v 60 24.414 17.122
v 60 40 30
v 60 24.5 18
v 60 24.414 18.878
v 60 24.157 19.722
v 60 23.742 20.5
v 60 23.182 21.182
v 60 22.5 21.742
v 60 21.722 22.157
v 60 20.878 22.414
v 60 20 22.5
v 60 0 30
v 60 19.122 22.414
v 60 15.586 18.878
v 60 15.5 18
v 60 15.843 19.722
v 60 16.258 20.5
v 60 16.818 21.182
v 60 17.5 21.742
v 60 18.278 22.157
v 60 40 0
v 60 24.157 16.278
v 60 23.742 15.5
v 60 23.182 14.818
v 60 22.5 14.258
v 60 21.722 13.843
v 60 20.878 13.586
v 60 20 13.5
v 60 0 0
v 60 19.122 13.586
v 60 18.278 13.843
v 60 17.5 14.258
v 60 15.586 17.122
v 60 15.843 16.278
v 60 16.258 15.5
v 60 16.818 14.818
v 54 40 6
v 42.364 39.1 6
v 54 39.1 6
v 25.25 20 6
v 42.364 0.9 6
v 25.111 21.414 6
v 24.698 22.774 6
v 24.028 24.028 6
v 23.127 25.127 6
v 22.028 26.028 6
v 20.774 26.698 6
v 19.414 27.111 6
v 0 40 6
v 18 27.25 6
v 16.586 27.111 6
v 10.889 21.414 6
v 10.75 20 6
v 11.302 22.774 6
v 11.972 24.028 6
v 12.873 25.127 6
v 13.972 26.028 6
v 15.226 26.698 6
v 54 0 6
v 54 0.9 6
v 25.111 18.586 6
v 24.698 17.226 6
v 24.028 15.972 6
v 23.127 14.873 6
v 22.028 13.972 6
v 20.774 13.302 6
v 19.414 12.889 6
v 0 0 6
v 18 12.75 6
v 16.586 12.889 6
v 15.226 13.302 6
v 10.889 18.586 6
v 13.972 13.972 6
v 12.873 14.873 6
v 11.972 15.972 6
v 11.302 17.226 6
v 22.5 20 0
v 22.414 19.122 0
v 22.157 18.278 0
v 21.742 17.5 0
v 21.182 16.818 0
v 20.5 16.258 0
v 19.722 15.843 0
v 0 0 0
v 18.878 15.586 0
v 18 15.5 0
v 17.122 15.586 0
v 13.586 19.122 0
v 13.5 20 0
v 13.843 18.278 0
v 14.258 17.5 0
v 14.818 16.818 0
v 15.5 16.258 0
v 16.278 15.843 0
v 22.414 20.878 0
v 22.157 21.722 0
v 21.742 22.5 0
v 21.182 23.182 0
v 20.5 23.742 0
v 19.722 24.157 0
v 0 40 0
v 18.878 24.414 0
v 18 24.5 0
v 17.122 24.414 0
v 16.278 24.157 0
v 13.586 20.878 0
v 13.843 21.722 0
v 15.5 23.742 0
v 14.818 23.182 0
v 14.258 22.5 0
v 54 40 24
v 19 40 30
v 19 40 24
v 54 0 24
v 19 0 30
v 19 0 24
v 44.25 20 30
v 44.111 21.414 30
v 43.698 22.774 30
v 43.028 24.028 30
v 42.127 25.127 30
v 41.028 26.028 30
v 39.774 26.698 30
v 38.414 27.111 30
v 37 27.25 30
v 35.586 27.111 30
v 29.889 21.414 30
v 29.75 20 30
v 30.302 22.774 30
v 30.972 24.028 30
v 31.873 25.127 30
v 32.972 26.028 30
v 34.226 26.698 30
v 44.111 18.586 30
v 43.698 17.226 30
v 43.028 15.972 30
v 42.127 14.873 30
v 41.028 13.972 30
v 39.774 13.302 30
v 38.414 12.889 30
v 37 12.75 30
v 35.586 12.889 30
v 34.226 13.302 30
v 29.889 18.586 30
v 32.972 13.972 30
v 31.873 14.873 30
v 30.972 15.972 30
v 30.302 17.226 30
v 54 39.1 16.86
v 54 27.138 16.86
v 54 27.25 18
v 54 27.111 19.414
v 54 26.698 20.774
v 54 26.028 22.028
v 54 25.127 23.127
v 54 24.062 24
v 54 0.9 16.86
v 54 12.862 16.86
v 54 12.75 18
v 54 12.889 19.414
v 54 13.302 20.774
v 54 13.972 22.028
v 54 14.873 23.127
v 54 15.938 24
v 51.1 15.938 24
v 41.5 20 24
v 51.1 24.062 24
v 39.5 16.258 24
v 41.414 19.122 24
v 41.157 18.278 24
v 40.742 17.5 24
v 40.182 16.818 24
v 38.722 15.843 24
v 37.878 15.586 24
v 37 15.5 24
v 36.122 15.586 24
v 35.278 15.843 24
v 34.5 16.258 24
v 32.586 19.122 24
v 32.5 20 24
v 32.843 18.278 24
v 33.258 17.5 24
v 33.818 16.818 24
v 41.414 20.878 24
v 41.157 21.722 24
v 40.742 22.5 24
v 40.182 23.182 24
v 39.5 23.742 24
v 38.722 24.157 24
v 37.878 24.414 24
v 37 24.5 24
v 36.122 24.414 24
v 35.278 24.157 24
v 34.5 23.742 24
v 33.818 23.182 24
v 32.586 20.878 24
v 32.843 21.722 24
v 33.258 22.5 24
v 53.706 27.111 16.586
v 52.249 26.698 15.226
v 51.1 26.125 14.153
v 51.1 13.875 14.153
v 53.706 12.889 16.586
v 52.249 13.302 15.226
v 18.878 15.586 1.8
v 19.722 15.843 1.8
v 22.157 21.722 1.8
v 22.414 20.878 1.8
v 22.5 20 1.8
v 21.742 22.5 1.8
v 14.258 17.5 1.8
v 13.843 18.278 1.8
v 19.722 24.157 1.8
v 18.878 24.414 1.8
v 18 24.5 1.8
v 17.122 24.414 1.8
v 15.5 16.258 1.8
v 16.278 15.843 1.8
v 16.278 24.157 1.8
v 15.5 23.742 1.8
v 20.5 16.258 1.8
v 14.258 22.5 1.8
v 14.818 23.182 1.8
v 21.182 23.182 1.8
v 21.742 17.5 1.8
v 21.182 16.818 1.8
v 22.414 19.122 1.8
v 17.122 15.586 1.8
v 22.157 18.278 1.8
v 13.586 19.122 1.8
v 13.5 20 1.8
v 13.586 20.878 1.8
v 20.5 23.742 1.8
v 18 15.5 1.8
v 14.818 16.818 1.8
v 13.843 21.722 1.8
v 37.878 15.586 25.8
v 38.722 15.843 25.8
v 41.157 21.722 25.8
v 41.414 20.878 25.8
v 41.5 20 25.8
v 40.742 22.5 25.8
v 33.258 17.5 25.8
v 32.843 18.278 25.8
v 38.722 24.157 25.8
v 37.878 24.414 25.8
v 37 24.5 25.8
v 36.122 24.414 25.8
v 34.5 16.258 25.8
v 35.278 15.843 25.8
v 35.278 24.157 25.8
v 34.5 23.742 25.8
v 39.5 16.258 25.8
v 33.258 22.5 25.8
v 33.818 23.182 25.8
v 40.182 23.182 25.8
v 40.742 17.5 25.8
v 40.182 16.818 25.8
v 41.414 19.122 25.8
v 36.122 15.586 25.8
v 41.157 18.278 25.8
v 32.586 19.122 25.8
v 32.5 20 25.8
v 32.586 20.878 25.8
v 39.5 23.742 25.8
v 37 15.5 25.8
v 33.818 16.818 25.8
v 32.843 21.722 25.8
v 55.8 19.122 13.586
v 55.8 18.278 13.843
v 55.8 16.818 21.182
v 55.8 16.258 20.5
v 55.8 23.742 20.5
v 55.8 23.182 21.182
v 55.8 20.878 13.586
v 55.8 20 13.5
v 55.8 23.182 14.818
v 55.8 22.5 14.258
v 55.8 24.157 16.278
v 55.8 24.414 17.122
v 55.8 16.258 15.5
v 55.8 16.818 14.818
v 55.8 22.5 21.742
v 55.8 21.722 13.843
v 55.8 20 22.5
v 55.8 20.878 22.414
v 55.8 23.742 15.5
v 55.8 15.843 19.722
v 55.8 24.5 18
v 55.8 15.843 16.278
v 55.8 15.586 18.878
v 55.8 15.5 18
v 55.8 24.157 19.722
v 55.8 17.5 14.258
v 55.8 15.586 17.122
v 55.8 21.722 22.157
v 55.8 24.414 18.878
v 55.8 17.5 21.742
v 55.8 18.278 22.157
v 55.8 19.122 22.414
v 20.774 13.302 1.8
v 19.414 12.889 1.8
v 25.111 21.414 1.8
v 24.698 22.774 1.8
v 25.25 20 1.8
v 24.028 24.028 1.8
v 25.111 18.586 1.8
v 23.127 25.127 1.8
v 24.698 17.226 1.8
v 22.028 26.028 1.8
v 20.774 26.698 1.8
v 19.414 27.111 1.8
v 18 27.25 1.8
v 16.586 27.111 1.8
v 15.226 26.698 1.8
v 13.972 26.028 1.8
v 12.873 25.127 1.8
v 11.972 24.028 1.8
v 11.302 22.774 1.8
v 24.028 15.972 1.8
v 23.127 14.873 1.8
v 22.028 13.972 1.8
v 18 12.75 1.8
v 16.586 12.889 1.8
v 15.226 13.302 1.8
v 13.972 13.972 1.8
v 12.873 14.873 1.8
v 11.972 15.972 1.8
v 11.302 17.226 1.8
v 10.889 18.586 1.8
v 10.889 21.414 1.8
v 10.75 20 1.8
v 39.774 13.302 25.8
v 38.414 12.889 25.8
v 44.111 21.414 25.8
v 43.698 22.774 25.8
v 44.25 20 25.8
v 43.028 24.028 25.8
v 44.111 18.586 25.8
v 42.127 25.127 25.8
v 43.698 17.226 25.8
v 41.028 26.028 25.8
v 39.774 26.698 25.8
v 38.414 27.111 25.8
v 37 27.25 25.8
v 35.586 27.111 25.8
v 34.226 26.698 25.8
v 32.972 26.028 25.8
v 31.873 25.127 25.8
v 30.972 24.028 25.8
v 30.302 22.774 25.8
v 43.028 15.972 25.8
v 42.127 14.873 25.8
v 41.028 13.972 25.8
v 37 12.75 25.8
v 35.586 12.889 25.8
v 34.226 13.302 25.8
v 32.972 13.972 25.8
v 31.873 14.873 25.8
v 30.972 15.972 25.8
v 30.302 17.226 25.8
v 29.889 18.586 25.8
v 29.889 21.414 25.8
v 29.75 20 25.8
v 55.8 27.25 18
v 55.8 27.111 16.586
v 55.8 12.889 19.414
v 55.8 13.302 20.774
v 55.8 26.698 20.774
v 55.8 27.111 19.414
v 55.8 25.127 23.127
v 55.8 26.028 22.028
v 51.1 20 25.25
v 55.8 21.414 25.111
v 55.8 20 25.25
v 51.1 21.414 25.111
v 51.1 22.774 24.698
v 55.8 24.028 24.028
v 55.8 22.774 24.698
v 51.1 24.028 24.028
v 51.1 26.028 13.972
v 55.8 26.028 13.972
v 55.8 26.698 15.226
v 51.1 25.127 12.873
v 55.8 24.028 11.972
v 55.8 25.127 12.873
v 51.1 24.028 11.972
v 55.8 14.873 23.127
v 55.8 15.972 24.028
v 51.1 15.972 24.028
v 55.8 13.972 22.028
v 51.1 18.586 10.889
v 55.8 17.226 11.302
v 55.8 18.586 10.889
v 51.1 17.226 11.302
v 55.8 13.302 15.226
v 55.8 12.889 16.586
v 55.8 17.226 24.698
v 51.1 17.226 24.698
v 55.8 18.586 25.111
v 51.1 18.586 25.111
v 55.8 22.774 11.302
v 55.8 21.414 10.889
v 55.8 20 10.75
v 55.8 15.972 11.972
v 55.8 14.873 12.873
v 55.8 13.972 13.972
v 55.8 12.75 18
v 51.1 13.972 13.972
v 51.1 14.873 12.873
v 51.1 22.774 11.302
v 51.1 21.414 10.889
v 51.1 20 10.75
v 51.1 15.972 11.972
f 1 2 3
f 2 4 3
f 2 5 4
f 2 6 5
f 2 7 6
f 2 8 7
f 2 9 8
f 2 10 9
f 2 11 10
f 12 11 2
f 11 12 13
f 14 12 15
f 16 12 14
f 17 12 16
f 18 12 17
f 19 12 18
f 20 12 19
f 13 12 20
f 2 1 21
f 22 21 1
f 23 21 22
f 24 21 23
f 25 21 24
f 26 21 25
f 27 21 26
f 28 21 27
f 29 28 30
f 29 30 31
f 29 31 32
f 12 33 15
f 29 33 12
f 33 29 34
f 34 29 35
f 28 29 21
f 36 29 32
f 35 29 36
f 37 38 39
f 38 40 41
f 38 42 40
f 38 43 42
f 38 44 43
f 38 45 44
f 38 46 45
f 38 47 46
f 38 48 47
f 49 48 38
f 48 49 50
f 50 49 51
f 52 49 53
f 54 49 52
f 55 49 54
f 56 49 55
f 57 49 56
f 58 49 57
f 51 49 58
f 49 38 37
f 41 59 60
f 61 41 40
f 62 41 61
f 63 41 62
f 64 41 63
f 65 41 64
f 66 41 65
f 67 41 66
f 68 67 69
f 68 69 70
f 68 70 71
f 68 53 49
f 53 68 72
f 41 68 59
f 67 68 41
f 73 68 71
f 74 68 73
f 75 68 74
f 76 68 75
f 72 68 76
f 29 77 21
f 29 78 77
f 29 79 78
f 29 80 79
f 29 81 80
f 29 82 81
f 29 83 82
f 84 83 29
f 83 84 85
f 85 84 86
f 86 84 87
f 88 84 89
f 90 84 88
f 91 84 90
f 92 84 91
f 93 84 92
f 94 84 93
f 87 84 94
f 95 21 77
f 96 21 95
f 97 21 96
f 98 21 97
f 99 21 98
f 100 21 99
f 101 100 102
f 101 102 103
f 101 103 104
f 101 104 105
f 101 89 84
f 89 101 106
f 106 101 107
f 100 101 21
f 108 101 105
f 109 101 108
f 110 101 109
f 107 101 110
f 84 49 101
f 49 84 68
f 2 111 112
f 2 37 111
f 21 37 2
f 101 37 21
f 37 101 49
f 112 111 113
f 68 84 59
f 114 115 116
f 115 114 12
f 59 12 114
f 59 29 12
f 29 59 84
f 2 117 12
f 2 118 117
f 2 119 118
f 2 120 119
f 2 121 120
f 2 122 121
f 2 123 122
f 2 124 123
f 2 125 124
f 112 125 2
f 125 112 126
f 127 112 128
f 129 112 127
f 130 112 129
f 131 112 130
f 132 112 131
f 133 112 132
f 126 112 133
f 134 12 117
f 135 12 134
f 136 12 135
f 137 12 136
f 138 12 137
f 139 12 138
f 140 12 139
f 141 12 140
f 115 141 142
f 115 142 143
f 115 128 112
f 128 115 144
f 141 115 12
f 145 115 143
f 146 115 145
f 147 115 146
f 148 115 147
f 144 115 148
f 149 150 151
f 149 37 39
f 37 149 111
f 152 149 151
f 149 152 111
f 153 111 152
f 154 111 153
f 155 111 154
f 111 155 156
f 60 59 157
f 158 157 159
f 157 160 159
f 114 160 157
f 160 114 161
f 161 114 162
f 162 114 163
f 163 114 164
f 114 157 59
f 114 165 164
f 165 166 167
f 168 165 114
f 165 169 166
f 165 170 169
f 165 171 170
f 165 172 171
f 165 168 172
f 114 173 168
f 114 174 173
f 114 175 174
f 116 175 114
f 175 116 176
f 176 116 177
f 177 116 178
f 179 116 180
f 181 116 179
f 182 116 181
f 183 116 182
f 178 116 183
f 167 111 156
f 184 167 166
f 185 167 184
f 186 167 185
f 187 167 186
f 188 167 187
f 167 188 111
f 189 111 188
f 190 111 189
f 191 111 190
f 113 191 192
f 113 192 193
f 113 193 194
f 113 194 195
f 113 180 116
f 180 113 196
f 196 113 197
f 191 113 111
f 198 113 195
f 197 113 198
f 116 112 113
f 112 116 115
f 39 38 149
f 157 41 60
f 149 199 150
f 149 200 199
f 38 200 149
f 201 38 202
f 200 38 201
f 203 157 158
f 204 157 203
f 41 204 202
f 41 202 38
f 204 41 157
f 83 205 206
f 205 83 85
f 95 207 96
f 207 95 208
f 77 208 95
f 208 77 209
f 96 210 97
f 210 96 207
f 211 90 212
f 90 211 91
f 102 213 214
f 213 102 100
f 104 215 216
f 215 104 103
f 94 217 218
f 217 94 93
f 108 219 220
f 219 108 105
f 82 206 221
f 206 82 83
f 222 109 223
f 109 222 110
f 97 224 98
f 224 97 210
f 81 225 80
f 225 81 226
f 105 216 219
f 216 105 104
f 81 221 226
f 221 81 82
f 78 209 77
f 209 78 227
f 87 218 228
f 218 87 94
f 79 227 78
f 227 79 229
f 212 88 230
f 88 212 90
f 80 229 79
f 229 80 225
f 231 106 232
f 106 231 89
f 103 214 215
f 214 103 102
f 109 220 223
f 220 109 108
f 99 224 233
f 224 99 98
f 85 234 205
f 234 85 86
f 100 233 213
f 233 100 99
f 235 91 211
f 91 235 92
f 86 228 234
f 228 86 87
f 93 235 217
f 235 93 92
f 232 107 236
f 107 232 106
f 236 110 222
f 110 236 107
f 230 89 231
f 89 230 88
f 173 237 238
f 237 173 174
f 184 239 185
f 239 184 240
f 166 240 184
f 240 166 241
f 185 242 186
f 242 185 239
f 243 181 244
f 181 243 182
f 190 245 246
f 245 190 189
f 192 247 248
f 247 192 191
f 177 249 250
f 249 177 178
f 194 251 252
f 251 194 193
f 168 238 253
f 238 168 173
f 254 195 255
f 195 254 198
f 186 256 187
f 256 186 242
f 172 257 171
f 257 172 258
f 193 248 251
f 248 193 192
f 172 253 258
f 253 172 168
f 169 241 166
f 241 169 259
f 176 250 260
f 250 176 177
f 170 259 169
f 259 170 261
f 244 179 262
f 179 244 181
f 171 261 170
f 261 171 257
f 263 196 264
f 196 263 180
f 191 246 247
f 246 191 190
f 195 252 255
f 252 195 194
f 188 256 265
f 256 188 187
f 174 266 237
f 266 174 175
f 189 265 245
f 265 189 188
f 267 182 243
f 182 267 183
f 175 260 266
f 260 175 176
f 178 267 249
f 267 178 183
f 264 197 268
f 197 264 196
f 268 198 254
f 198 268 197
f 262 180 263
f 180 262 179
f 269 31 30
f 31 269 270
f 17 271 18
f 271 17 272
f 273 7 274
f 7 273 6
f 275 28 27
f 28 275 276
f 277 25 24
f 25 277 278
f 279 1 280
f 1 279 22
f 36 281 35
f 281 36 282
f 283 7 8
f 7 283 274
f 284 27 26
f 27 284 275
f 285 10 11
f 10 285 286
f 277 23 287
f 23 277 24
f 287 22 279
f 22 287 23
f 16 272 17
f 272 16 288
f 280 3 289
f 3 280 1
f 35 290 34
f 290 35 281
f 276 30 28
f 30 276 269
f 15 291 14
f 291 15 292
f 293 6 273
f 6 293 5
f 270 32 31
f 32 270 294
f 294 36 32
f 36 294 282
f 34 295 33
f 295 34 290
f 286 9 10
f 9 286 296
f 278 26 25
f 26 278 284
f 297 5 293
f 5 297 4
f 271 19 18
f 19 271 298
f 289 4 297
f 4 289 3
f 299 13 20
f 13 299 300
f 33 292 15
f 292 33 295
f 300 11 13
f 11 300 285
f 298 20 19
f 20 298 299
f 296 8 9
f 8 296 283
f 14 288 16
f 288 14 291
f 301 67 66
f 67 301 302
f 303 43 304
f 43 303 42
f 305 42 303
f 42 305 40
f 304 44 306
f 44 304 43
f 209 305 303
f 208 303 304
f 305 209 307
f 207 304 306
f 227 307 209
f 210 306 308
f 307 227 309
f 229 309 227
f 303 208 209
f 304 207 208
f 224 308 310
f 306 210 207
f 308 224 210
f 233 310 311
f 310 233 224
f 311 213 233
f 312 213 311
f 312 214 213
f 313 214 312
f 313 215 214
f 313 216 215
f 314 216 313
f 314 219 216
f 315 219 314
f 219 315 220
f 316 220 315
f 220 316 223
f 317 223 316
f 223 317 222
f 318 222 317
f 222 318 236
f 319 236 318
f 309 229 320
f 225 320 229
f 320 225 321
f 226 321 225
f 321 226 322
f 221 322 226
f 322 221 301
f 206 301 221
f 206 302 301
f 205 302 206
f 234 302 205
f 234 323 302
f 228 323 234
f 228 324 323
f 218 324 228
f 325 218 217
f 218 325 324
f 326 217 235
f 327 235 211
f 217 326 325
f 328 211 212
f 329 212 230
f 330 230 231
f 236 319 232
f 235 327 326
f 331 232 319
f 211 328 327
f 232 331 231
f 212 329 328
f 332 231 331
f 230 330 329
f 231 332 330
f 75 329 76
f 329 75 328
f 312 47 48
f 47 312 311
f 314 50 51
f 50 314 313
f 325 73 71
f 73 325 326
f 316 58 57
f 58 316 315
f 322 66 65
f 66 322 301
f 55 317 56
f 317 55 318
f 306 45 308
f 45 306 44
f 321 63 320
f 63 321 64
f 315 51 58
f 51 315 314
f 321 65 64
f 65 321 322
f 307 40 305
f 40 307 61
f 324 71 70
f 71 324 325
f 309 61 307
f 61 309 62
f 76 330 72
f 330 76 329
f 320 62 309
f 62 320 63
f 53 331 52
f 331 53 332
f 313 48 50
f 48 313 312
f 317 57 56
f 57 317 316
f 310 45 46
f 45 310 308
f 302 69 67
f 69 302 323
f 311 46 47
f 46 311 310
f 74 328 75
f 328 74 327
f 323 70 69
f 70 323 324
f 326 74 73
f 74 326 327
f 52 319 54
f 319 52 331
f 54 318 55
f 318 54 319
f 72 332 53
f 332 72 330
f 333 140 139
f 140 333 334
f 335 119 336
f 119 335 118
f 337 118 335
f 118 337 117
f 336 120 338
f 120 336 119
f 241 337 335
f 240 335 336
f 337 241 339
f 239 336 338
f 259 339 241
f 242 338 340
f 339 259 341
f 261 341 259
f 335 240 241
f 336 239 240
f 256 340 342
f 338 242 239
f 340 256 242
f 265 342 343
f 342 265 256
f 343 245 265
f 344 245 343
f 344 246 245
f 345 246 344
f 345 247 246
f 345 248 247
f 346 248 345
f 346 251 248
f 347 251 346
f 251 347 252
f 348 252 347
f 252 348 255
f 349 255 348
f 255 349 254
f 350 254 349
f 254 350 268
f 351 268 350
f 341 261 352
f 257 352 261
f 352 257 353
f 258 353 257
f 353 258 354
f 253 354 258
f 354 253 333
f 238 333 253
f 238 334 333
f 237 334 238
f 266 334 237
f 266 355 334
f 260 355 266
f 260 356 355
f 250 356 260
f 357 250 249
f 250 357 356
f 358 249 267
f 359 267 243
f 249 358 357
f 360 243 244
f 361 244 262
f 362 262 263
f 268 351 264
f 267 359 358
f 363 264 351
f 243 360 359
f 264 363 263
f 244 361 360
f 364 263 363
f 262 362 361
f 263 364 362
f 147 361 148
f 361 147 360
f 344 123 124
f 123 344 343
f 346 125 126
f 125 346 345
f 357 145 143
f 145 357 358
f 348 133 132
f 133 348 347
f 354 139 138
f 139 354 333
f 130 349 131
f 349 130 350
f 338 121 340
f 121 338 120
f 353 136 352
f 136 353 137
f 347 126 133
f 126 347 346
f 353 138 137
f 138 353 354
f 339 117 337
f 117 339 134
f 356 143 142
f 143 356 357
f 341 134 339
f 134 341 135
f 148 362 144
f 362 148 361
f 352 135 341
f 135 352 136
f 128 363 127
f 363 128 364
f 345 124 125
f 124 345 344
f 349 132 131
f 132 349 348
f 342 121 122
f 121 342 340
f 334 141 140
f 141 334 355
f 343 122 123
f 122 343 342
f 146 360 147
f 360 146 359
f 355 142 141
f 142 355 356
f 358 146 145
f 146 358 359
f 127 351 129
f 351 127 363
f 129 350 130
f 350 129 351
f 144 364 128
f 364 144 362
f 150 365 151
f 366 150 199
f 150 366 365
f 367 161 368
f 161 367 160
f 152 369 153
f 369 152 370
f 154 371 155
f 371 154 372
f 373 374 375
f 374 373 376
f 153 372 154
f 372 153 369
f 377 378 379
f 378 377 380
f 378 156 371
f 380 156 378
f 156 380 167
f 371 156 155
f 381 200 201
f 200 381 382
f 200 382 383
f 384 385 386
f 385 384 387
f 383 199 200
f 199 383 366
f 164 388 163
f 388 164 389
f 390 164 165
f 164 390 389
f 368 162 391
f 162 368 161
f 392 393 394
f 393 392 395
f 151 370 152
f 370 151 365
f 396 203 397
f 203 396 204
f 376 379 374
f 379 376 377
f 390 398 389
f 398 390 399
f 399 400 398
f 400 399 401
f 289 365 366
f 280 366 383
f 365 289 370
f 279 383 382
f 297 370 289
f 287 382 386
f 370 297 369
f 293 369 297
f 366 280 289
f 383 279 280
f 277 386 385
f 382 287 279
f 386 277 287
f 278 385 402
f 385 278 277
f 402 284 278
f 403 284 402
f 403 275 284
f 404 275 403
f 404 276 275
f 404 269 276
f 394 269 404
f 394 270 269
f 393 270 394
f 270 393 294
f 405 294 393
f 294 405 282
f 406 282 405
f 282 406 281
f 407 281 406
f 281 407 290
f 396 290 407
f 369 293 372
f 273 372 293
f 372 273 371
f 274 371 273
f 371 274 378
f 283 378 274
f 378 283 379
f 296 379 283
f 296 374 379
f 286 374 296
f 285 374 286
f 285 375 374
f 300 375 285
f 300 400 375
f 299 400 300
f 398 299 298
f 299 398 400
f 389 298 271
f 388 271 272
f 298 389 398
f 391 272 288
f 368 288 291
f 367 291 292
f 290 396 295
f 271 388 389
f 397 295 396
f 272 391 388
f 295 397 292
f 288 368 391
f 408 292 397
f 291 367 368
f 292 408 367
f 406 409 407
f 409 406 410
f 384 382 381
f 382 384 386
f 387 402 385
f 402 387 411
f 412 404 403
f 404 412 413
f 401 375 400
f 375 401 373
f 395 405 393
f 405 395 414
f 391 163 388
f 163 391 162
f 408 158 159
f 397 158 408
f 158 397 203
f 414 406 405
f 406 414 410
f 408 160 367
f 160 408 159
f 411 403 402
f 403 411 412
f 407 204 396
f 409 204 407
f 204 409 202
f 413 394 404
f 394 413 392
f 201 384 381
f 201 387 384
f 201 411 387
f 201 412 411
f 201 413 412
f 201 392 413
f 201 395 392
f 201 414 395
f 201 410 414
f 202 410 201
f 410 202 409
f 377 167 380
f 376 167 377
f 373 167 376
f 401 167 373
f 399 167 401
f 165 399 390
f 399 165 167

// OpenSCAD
$fn = 32;

// ----------------------------------------------------------------------
// Z-bracket: 60 x 40 x 30 mm
// ----------------------------------------------------------------------

// --- parameters (mm) ---
lower_leg = 60;           // lower foot length, X
upper_leg = 35;           // upper foot length, X
bracket_w = 40;           // bracket width, Y
offset_h = 30;            // overall rise, Z
sheet_t = 6;              // plate thickness
hole_d = 9;               // clearance for M8
cb_d = 14.5;              // counterbore diameter
cb_h = 4.2;               // counterbore depth
rib_len = 12.6;           // gusset leg
rib_sink = 0.9;           // gusset overlap into the plates

module hole_z(px, py, z0) {
  translate([px, py, z0 - 0.5]) cylinder(h = sheet_t + 1, d = hole_d);
}
module hole_x(py, pz) {
  translate([-0.5, py, pz]) rotate([0, 90, 0]) cylinder(h = sheet_t + 1, d = hole_d);
}
module cb_z(px, py, top_z) {
  translate([px, py, top_z - cb_h]) cylinder(h = cb_h + 0.5, d = cb_d);
}
module cb_x(py, pz) {
  translate([sheet_t - cb_h, py, pz]) rotate([0, -90, 0]) cylinder(h = cb_h + 0.5, d = cb_d);
}
module gusset(x0) {
  translate([x0, bracket_w - rib_sink, 0])
    rotate([90, 0, 0])
      linear_extrude(height = bracket_w - 2 * rib_sink)
        polygon(points = [[rib_sink, sheet_t - rib_sink],
                          [rib_sink, sheet_t - rib_sink + rib_len],
                          [-rib_len, sheet_t - rib_sink]]);
}

difference() {
  union() {
    cube([lower_leg, bracket_w, sheet_t]);
    /* web, overlapping the lower foot */
    translate([lower_leg - sheet_t, 0, 0]) cube([sheet_t, bracket_w, offset_h]);
    /* upper foot, sunk into the web */
    translate([lower_leg - sheet_t - upper_leg, 0, offset_h - sheet_t]) cube([upper_leg + sheet_t, bracket_w, sheet_t]);
    gusset(lower_leg - sheet_t);
  }
  hole_z(18, 20, 0);
  translate([lower_leg - sheet_t - 17, 0, 0]) hole_z(0, 20, offset_h - sheet_t);
  translate([lower_leg - sheet_t, 0, 0]) hole_x(20, 18);
  cb_z(18, 20, sheet_t);
  translate([lower_leg - sheet_t - 17, 0, 0]) cb_z(0, 20, offset_h);
  translate([lower_leg - sheet_t, 0, 0]) cb_x(20, 18);
}
